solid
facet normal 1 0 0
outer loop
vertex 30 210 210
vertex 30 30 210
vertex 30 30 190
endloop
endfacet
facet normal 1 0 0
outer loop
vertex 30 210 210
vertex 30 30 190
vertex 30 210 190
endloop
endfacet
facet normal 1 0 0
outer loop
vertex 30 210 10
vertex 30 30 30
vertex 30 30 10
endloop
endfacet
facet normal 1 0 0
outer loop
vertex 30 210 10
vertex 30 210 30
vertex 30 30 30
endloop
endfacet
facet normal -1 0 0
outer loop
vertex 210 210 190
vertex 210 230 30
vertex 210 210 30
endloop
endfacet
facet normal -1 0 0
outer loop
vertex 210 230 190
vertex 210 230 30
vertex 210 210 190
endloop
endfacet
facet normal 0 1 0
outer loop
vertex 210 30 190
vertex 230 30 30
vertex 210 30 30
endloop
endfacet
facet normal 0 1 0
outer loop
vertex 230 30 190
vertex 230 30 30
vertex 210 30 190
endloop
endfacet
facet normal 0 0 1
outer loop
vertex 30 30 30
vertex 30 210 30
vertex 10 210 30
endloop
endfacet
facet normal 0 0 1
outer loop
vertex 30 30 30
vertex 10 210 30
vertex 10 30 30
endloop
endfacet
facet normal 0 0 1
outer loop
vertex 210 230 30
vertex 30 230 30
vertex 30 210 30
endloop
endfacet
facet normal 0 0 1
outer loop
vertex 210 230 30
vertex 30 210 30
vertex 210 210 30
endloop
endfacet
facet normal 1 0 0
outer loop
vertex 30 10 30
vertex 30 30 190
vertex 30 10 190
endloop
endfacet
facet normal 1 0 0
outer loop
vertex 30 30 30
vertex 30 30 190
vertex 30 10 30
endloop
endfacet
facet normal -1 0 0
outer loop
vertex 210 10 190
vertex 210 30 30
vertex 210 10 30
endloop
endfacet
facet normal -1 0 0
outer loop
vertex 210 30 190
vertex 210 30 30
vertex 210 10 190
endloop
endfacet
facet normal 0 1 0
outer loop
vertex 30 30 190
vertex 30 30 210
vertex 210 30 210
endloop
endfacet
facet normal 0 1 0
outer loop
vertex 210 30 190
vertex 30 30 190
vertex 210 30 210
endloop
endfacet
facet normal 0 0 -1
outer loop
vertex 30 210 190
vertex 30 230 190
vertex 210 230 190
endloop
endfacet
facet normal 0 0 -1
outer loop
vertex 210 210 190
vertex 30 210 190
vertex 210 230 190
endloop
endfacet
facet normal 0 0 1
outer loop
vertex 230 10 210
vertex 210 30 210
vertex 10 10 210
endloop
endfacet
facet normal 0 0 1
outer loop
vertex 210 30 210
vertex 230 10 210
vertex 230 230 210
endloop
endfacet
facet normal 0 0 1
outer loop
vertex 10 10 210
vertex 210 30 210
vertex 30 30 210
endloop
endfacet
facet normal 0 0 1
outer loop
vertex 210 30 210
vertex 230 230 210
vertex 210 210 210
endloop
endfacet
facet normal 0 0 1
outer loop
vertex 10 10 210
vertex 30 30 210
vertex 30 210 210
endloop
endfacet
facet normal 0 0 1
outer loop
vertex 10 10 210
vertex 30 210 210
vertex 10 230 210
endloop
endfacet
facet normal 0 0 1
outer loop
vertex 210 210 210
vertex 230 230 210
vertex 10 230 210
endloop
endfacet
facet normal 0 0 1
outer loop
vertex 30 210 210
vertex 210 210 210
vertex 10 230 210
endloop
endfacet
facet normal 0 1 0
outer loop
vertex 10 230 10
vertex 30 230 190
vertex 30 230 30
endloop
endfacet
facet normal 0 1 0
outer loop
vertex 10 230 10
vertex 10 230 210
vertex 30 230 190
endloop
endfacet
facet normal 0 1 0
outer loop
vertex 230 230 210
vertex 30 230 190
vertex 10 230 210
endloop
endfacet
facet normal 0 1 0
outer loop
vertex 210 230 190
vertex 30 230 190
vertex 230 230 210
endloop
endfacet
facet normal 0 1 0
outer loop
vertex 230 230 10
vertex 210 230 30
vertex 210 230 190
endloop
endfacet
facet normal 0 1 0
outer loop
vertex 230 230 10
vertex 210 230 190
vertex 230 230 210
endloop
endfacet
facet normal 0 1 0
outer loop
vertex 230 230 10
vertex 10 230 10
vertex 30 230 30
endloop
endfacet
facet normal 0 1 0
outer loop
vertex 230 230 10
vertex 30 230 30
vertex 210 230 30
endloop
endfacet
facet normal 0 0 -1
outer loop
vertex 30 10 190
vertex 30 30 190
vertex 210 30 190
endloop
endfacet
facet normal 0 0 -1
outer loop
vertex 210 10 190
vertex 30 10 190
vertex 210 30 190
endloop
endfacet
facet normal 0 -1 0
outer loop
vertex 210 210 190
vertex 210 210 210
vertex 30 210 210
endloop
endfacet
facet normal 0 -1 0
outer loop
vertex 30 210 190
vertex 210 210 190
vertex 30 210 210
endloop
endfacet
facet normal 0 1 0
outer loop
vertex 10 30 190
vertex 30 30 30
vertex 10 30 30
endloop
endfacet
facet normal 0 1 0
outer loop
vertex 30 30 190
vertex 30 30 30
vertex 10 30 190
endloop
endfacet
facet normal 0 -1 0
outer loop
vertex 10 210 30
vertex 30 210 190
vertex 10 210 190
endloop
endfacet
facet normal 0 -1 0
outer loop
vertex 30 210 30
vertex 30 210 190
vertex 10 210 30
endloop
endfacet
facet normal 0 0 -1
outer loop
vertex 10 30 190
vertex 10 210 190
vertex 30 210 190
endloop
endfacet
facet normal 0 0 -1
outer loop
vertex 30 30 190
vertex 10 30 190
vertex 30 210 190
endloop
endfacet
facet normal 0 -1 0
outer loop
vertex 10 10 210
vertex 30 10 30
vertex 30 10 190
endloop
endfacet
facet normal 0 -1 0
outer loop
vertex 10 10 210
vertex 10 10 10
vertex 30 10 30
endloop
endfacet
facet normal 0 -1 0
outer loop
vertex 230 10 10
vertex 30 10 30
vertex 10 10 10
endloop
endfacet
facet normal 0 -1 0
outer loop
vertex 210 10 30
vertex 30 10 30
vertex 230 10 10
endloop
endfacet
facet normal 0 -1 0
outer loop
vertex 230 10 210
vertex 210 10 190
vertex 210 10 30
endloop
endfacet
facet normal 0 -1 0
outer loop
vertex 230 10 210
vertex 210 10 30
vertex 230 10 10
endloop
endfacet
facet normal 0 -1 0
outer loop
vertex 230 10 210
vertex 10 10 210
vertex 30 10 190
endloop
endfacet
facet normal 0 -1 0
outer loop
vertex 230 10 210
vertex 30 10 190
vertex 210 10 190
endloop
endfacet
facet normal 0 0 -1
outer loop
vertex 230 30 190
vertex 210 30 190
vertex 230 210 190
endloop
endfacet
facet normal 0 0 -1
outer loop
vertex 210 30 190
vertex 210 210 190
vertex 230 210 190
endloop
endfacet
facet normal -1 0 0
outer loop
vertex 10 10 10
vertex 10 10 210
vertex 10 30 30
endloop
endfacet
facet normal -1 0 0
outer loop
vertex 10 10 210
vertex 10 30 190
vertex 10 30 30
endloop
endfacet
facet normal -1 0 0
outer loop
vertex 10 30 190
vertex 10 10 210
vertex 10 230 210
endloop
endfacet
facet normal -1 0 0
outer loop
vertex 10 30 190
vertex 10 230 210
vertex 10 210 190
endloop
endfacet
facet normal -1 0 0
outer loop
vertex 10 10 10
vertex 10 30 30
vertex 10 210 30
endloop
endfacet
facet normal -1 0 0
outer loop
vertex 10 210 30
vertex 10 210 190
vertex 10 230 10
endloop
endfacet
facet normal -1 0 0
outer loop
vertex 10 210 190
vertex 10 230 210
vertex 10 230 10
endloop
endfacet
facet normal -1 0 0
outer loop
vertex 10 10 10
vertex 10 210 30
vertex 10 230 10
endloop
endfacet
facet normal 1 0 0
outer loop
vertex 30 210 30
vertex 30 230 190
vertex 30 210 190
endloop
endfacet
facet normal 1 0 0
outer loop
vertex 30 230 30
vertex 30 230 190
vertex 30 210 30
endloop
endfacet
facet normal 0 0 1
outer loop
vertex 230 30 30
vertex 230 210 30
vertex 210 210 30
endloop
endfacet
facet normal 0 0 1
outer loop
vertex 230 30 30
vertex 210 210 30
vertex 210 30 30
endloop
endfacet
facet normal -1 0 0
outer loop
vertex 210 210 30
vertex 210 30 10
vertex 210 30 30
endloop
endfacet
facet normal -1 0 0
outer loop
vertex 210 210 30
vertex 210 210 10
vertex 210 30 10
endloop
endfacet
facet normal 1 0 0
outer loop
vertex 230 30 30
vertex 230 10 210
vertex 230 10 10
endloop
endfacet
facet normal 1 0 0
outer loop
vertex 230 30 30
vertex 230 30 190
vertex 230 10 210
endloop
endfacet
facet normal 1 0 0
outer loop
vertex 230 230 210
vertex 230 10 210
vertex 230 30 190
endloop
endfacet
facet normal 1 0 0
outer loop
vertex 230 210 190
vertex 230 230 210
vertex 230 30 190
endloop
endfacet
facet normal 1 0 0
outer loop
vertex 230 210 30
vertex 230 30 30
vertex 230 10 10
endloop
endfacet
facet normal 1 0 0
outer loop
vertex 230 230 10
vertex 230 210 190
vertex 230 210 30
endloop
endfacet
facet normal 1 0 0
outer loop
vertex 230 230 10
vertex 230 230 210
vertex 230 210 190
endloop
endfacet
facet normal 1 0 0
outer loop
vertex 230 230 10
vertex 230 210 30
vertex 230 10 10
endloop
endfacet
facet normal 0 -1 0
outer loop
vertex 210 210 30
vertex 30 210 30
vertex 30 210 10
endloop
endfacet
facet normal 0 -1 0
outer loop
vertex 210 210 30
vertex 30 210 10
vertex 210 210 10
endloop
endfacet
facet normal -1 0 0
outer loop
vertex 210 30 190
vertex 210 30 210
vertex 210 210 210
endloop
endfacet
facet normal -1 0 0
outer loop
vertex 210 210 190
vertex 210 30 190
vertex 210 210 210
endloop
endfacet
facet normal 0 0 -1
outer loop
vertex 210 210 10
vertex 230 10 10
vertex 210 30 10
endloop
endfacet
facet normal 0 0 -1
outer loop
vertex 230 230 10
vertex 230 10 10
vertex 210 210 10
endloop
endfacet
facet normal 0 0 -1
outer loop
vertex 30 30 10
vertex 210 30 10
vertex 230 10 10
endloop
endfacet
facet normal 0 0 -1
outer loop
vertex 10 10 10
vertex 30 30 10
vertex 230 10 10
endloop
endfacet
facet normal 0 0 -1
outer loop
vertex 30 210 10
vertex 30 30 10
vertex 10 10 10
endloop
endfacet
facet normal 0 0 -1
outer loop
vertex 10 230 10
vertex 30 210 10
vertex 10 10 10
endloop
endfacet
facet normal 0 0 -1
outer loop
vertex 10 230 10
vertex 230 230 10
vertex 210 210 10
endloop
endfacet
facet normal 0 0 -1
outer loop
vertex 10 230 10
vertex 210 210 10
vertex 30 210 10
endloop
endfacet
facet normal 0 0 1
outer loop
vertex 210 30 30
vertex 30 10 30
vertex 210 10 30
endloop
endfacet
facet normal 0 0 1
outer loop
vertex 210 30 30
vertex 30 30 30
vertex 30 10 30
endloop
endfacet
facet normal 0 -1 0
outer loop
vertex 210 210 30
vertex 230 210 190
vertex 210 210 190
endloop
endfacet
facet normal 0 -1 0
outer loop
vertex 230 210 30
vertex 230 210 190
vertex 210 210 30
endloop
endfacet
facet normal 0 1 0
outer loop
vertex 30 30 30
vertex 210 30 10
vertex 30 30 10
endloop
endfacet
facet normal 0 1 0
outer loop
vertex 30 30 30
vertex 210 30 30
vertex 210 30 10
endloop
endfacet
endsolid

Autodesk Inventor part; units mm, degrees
ref_plane "YZ Plane" through (0, 0, 0) normal (1, 0, 0) x (0, 1, 0)
ref_plane "XZ Plane" through (0, 0, 0) normal (0, 1, 0) x (-1, 0, 0)
ref_plane "XY Plane" through (0, 0, 0) normal (0, 0, 1) x (1, 0, 0)
sketch "Sketch1" plane through (0, 0, 0) normal (0, 0, 1) x (1, 0, 0)
  line L0 (0, 0) -> (240, 0)
  line L1 (240, 0) -> (240, 240)
  line L2 (240, 240) -> (0, 240)
  line L3 (0, 240) -> (0, 0)
  dimension "d0" = 240
  dimension "d1" = 240
extrude "Extrusion1" add sketch "Sketch1" along normal blind 240
sketch "Sketch2" plane through (0, 0, 240) normal (0, 0, 1) x (1, 0, 0)
  line L0 (30, 210) -> (210, 210)
  line L1 (210, 210) -> (210, 30)
  line L2 (210, 30) -> (30, 30)
  line L3 (30, 30) -> (30, 210)
  line L4 (240, 240) -> (0, 240) projected
  line L5 (0, 240) -> (0, 0) projected
  line L6 (240, 0) -> (240, 240) projected
  line L7 (0, 0) -> (240, 0) projected
  dimension "d4" = 30
  dimension "d5" = 30
  dimension "d6" = 30
  dimension "d7" = 30
extrude "Extrusion2" cut sketch "Sketch2" against normal blind 500 contours L0 L1 L2 L3
sketch "Sketch3" plane through (0, 240, 0) normal (0, 1, 0) x (1, 0, 0)
  line L0 (30, -30) -> (210, -30)
  line L1 (210, -30) -> (210, -210)
  line L2 (210, -210) -> (30, -210)
  line L3 (30, -210) -> (30, -30)
  line L4 (240, 0) -> (0, 0) projected
  line L5 (0, 0) -> (0, -240) projected
  line L6 (240, 0) -> (240, -240) projected
  line L7 (240, -240) -> (0, -240) projected
  dimension "d10" = 30
  dimension "d11" = 30
  dimension "d12" = 30
  dimension "d13" = 30
extrude "Extrusion3" cut sketch "Sketch3" against normal blind 500 contours L0 L1 L2 L3
sketch "Sketch4" plane through (240, 0, 0) normal (1, 0, 0) x (0, 0, -1)
  line L0 (-240, 210) -> (-210, 210) projected
  line L1 (-30, 30) -> (-30, 0) projected
  line L2 (-210, 210) -> (-30, 210)
  line L3 (-30, 210) -> (-30, 30)
  line L4 (-30, 30) -> (-210, 30)
  line L5 (-210, 30) -> (-210, 210)
  point P0 (0, 0)
extrude "Extrusion4" cut sketch "Sketch4" against normal blind 500
sketch "Sketch5" plane through (0, 0, 240) normal (0, 0, 1) x (1, 0, 0)
  line L0 (0, 0) -> (240, 0) projected
  line L1 (240, 240) -> (0, 240) projected
  line L2 (0, 0) -> (10, 0)
  line L3 (10, 0) -> (10, 240)
  line L4 (10, 240) -> (0, 240)
  line L5 (0, 240) -> (0, 0)
  line L6 (10, 240) -> (240, 240)
  line L7 (240, 240) -> (240, 230)
  line L8 (240, 230) -> (10, 230)
  line L9 (10, 230) -> (10, 240)
  line L10 (10, 0) -> (240, 0)
  line L11 (240, 0) -> (240, 10)
  line L12 (240, 10) -> (10, 10)
  line L13 (10, 10) -> (10, 0)
  line L14 (240, 230) -> (230, 230)
  line L15 (230, 230) -> (230, 10)
  line L16 (230, 10) -> (240, 10)
  line L17 (240, 10) -> (240, 230)
  dimension "d18" = 10
  dimension "d19" = 10
  dimension "d20" = 10
  dimension "d21" = 10
extrude "Extrusion5" cut sketch "Sketch5" against normal blind 900 contours L5 L1 L3 L0 | L3 L12 L11 L0 | L1 L7 L8 L3 | L12 L15 L8 L17
sketch "Sketch6" plane through (10, 230, 240) normal (0, 1, 0) x (1, 0, 0)
  line L0 (0, 240) -> (220.3242, 240)
  line L1 (220.3242, 240) -> (220.3242, 230)
  line L2 (220.3242, 230) -> (0, 230)
  line L3 (0, 230) -> (0, 240)
  line L4 (0, 0) -> (220, 0) projected
  line L5 (220, 0) -> (220, 240) projected
  line L6 (0, 0) -> (220, 0)
  line L7 (220, 0) -> (220, 10)
  line L8 (220, 10) -> (0, 10)
  line L9 (0, 10) -> (0, 0)
  point P0 (-10, 240)
  dimension "d24" = 10
  dimension "d25" = 10
extrude "Extrusion6" cut sketch "Sketch6" against normal blind 900
sketch "Sketch10" plane through (10, 230, 230) normal (0, 1, 0) x (1, 0, 0)
  line L0 (0, 0) -> (0, 220) projected
  line L1 (220, 20) -> (200, 20) projected
  line L2 (0, 0) -> (220, 0)
  line L3 (220, 0) -> (220, 20)
  line L4 (220, 20) -> (0, 20)
  line L5 (0, 20) -> (0, 0)
  point P0 (-10, 230)
extrude "Extrusion7" cut sketch "Sketch10" against normal blind 900
sketch "Sketch11" plane through (230, 30, 30) normal (1, 0, 0) x (0, 0, -1)
  line L0 (-180, 0) -> (0, 0) projected
  line L1 (0, 180) -> (-180, 180) projected
  line L2 (-180, 0) -> (-160, 0)
  line L3 (-160, 0) -> (-160, 180)
  line L4 (-160, 180) -> (-180, 180)
  line L5 (-180, 180) -> (-180, 0)
  point P0 (30, -30)
  dimension "d31" = 20
extrude "Extrusion8" add sketch "Sketch11" against normal blind 220
sketch "Sketch12" plane through (30, 210, 210) normal (0, 1, 0) x (1, 0, 0)
  line L0 (180, 180) -> (180, 20) projected
  line L1 (0, 0) -> (180, 0)
  line L2 (180, 0) -> (180, 20)
  line L3 (180, 20) -> (0, 20)
  line L4 (0, 20) -> (0, 0)
  point P0 (-30, 210)
extrude "Extrusion9" add sketch "Sketch12" along normal blind 20
sketch "Sketch13" plane through (30, 30, 190) normal (0, -1, 0) x (1, 0, 0)
  line L0 (0, 0) -> (-20, 0) projected
  line L1 (180, 20) -> (0, 20)
  line L2 (0, 20) -> (0, 0)
  line L3 (0, 0) -> (180, 0)
  line L4 (180, 0) -> (180, 20)
  point P0 (-30, -190)
extrude "Extrusion10" add sketch "Sketch13" along normal blind 20
sketch "Sketch14" plane through (10, 230, 210) normal (0, 0, 1) x (1, 0, 0)
  line L0 (220, -20) -> (200, -20) projected
  line L1 (20, -200) -> (20, -20) projected
  line L2 (200, -20) -> (20, -20)
  line L3 (20, -20) -> (20, -200)
  line L4 (20, -200) -> (200, -200)
  line L5 (200, -200) -> (200, -20)
  point P0 (-10, -230)
extrude "Extrusion11" cut sketch "Sketch14" against normal blind 20
properties part number "Gearbox Housing"
